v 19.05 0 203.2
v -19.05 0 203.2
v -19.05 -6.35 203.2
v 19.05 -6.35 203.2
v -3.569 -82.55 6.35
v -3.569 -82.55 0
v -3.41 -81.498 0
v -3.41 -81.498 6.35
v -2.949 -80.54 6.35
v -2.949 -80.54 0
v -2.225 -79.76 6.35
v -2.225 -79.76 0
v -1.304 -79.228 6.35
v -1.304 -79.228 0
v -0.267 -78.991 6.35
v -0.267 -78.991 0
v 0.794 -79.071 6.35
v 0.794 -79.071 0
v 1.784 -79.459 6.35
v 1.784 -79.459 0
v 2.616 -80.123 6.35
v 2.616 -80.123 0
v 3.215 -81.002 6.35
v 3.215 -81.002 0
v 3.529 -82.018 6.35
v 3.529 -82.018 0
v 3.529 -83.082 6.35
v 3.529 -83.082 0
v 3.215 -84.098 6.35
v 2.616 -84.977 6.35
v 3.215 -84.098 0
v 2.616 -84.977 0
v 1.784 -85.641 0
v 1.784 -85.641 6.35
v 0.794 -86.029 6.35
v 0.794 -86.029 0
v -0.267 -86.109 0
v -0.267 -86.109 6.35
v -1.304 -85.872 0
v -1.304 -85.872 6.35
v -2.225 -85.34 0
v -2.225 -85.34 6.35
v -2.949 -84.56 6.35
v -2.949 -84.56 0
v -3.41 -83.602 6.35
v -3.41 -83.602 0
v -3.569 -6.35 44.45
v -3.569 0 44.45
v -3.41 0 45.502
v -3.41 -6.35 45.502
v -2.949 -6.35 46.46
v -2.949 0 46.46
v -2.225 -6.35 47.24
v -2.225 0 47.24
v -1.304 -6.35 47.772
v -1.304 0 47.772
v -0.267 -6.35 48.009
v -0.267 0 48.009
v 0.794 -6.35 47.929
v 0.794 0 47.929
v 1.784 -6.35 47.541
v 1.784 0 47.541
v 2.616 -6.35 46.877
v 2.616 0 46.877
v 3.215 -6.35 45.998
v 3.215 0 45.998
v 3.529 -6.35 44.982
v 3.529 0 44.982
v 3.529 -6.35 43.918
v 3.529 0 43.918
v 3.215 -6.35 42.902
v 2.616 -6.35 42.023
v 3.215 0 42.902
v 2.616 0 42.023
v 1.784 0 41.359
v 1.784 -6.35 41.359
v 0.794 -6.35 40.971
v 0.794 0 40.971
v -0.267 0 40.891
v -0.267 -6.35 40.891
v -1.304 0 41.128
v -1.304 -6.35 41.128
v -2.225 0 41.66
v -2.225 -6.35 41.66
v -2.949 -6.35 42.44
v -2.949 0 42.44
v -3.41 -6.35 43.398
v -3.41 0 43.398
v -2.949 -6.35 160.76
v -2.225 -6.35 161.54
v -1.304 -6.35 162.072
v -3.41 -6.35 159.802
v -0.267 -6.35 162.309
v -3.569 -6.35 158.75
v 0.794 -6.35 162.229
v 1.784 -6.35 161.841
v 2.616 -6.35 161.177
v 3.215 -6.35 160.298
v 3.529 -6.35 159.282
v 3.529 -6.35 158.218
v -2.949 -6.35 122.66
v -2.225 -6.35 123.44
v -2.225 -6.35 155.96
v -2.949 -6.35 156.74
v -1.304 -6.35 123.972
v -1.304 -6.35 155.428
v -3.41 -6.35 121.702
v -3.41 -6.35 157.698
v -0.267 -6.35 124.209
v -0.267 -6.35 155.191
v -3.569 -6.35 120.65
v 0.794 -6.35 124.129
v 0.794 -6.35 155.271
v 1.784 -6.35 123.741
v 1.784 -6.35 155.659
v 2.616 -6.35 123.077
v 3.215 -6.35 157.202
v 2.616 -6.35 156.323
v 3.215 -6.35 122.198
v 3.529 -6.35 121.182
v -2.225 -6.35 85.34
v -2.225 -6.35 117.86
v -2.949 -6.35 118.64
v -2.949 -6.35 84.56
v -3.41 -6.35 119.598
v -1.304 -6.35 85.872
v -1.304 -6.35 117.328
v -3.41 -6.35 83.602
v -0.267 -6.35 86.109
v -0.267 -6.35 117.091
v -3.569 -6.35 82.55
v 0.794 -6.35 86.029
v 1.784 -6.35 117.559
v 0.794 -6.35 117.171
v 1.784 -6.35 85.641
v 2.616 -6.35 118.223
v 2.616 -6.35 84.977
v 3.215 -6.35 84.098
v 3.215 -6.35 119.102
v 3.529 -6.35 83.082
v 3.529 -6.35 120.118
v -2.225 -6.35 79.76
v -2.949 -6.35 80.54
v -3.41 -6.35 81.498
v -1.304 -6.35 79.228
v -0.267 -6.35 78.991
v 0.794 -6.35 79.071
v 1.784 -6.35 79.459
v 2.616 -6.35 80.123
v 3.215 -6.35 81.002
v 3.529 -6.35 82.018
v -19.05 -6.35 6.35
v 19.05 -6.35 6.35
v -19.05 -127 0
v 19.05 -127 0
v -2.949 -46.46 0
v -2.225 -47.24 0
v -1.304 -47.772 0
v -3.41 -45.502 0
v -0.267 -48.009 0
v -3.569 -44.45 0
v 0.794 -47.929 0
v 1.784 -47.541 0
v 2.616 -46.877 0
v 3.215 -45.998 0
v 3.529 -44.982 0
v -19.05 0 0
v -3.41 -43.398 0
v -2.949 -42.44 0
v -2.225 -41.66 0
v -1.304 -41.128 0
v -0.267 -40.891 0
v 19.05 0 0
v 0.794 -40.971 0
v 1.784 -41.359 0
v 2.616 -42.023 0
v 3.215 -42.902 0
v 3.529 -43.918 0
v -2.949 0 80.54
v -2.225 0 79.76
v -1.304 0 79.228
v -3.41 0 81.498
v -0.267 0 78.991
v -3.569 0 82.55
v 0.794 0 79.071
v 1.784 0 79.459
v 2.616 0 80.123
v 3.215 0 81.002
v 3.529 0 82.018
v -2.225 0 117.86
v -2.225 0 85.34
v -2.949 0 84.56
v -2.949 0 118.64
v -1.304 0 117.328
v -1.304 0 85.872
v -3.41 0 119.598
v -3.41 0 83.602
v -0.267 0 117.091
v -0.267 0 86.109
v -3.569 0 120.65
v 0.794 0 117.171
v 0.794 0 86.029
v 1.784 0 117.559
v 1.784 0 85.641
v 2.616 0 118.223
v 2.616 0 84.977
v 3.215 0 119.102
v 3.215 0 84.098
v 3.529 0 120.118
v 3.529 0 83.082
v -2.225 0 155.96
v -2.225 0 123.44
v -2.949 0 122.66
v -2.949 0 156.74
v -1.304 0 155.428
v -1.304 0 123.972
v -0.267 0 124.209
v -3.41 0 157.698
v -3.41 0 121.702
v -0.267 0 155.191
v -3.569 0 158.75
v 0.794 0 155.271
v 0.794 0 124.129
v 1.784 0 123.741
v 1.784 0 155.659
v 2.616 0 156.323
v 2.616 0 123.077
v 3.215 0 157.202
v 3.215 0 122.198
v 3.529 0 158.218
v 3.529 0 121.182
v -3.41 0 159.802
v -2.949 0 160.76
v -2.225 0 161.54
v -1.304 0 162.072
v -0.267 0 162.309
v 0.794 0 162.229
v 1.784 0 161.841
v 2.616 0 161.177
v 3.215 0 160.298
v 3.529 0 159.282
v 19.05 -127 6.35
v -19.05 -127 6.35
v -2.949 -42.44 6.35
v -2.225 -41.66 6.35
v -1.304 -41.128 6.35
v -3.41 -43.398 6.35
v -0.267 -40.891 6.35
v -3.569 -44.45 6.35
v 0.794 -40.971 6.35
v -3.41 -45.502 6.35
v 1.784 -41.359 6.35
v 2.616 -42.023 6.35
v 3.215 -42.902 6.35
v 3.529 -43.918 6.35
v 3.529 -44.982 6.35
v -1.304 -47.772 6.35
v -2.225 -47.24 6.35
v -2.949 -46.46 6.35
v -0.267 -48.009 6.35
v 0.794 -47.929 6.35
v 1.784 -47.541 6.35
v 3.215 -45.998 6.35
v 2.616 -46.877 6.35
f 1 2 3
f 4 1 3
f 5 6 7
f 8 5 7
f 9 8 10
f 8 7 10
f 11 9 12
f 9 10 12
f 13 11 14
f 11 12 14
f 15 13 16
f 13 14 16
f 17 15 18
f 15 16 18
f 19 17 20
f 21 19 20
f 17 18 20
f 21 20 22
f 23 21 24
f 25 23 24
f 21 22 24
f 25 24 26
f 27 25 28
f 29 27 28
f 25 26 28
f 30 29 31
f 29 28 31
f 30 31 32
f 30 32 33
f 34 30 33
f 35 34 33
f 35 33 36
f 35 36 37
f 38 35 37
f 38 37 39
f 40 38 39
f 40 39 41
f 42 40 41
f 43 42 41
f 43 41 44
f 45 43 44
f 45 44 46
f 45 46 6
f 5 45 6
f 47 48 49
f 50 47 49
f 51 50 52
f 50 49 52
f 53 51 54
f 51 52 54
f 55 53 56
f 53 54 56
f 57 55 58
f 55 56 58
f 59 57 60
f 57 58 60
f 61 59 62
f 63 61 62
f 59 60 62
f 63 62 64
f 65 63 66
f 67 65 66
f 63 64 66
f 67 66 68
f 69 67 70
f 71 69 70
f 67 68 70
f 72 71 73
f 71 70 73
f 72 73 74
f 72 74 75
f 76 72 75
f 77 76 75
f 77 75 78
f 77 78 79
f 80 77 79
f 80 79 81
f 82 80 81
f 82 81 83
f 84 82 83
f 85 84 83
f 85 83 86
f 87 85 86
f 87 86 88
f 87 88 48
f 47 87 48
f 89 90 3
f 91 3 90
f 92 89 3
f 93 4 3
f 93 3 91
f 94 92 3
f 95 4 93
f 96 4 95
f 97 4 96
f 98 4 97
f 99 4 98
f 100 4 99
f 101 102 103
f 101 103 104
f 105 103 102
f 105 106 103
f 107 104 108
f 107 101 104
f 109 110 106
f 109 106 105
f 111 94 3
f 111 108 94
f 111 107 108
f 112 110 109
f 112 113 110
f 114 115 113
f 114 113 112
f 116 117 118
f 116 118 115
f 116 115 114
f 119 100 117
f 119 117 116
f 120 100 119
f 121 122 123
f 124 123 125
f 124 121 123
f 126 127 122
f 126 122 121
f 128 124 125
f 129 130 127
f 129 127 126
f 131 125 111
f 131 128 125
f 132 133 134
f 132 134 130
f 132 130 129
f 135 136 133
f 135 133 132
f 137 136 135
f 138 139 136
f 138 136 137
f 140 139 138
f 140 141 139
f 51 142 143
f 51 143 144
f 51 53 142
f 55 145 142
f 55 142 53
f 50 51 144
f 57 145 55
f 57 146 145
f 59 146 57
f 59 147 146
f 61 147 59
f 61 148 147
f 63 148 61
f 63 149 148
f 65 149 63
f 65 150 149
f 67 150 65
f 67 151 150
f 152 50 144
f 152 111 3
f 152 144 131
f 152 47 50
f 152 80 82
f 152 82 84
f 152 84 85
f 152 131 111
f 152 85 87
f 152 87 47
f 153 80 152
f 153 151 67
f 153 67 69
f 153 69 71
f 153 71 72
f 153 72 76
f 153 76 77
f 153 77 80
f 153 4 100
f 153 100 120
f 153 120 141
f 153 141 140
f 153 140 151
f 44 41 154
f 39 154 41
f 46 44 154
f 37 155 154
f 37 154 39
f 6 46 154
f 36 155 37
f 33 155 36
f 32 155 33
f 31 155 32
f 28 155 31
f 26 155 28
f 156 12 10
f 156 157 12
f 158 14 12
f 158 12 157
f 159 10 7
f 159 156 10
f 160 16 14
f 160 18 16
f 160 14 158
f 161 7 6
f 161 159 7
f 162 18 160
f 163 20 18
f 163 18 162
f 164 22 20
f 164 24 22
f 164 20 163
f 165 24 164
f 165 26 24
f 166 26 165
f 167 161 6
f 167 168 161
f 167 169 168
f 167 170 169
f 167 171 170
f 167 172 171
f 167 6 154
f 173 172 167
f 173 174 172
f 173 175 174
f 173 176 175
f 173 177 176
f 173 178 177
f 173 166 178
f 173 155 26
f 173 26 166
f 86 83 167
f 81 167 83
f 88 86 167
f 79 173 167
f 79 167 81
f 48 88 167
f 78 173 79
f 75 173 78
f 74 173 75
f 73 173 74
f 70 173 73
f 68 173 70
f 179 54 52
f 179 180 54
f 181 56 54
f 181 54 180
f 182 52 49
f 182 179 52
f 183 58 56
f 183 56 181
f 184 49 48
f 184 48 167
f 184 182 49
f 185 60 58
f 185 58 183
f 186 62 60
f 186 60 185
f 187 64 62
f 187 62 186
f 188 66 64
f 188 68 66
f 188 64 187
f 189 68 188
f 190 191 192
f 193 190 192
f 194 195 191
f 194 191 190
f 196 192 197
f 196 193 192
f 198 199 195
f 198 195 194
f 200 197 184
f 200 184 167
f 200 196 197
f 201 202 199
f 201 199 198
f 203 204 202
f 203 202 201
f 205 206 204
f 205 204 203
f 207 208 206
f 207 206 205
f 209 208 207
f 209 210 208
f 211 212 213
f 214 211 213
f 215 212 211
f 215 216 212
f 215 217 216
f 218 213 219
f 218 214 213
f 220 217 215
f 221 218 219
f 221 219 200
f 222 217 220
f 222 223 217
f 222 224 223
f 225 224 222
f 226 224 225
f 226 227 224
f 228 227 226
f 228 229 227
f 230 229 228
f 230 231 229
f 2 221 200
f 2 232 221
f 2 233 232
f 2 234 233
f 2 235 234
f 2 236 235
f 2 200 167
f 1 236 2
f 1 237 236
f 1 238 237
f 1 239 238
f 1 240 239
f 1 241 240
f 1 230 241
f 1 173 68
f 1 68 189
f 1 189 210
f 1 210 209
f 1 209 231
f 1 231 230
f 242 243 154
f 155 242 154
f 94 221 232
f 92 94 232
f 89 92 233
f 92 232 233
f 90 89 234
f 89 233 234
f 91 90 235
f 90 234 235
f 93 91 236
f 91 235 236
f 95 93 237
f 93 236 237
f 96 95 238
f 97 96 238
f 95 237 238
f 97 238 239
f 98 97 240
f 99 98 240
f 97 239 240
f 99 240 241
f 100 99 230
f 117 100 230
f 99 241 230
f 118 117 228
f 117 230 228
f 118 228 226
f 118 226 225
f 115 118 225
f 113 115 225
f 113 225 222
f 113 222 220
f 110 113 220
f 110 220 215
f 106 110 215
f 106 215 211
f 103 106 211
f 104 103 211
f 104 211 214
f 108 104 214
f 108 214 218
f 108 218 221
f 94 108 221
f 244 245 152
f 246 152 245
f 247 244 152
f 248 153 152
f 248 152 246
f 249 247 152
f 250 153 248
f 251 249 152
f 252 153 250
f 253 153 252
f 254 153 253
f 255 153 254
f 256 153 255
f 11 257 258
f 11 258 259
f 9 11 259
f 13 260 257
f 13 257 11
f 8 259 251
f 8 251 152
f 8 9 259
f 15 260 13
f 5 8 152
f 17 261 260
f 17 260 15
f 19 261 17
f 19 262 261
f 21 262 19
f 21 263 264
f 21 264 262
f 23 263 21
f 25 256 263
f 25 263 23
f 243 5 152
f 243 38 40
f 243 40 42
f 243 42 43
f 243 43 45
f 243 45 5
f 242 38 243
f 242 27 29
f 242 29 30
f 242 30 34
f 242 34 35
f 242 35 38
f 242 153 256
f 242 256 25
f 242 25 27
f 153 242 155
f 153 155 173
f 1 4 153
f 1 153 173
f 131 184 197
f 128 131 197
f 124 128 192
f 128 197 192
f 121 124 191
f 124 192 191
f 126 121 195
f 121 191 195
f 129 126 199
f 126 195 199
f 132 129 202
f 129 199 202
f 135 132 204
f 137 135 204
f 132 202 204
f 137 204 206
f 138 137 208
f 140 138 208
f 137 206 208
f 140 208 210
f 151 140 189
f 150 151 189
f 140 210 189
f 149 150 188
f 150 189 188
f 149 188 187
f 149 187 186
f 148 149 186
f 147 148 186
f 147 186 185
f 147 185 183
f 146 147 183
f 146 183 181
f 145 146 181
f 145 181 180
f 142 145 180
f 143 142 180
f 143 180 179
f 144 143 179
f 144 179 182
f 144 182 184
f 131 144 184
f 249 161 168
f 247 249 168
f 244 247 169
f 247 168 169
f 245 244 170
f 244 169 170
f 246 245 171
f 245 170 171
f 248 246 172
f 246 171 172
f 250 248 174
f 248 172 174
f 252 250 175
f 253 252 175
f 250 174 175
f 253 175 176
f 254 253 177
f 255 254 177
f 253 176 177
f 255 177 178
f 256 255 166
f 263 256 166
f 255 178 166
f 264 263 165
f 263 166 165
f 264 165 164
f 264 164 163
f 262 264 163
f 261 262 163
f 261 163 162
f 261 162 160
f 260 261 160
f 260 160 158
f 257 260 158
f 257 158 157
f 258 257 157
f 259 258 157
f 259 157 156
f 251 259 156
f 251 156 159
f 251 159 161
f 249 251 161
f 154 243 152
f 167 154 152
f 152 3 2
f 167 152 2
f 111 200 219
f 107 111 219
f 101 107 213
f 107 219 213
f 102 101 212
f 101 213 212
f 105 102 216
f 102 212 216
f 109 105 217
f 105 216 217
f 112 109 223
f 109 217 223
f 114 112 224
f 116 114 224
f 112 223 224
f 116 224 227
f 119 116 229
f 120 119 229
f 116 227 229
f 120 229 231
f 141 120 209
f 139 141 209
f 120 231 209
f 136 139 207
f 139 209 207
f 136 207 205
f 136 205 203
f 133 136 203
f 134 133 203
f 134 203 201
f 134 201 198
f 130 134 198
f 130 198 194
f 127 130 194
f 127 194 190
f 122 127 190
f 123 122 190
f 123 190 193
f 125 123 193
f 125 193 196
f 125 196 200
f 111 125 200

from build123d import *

# Parameters (mm, degrees)
F1_DEPTH   = 19.05
F4_D       = 7.1374
F4_ON_F2_D = 7.1374


with BuildPart() as f1:
    # F0 (on Right) → F1 (new body, symmetric)
    with BuildSketch(Plane.YZ):
        Polygon((0, 0), (0, 203.2), (-6.3499999233, 203.2), (-6.3499999233, 6.3499999233), (-127, 6.3499999233), (-127, 0), align=None)
    extrude(amount=F1_DEPTH, both=True)

    # F4 (through all)
    with Locations(Plane.XZ.offset(6.3499999233)):
        with Locations((0, 158.7499999233), (0, 120.6499999233), (0, 82.5499999233), (0, 44.4499999233)):
            Hole(F4_D / 2)

    # F4 on F2 (through all)
    with Locations(Plane.XY.offset(6.3499999233)):
        with Locations((0, -44.4499999233), (0, -82.5499999233)):
            Hole(F4_ON_F2_D / 2)


solid = f1.part
